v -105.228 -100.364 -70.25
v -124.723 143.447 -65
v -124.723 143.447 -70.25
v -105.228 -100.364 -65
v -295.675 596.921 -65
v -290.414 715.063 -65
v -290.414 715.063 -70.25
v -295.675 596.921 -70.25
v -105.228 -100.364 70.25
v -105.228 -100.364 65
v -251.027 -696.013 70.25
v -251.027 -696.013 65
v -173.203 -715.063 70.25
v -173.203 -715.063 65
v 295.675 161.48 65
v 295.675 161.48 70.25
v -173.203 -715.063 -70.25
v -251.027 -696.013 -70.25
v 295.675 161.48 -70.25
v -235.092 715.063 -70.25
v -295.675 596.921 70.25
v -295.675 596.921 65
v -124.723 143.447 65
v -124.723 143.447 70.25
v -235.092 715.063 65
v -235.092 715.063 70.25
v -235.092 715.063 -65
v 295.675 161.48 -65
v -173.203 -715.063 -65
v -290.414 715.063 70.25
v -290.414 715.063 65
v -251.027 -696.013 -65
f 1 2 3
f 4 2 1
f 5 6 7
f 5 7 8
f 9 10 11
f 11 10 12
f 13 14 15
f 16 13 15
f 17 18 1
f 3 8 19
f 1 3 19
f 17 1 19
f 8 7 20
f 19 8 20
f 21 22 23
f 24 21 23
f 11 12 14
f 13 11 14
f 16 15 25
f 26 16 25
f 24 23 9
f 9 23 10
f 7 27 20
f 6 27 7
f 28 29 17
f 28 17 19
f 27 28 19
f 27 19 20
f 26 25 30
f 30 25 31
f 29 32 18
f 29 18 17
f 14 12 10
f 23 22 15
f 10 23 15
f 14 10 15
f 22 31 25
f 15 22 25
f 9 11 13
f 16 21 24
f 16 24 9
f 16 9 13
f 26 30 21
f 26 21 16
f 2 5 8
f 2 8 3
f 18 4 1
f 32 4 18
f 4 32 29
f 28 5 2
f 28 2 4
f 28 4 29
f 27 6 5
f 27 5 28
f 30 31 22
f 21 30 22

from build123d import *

# Parameters (mm, degrees)
BOSS_EXTRUDE1_START = 65
BOSS_EXTRUDE1_DEPTH = 5.25
BOSS_EXTRUDE2_START = -65
BOSS_EXTRUDE2_DEPTH = 5.25


with BuildPart() as part:
    # Sketch1 → Boss-Extrude1 (new body)
    with BuildSketch(Plane.XY.offset(BOSS_EXTRUDE1_START)):
        Polygon((295.675074254, 161.480188615), (-235.091721205, 715.062577473), (-290.413622869, 715.062577473), (-295.675074254, 596.921443574), (-124.723344844, 143.447345429), (-105.228202032, -100.364094919), (-251.02667789, -696.013410022), (-173.202657588, -715.062577473), align=None)
    extrude(amount=BOSS_EXTRUDE1_DEPTH)


with BuildPart() as body_2:
    # Sketch1<2> → Boss-Extrude2 (new body)
    with BuildSketch(Plane.XY.offset(BOSS_EXTRUDE2_START)):
        Polygon((295.675074254, 161.480188615), (-235.091721205, 715.062577473), (-290.413622869, 715.062577473), (-295.675074254, 596.921443574), (-124.723344844, 143.447345429), (-105.228202032, -100.364094919), (-251.02667789, -696.013410022), (-173.202657588, -715.062577473), align=None)
    extrude(amount=-BOSS_EXTRUDE2_DEPTH)


solid = Compound([part.part, body_2.part])
